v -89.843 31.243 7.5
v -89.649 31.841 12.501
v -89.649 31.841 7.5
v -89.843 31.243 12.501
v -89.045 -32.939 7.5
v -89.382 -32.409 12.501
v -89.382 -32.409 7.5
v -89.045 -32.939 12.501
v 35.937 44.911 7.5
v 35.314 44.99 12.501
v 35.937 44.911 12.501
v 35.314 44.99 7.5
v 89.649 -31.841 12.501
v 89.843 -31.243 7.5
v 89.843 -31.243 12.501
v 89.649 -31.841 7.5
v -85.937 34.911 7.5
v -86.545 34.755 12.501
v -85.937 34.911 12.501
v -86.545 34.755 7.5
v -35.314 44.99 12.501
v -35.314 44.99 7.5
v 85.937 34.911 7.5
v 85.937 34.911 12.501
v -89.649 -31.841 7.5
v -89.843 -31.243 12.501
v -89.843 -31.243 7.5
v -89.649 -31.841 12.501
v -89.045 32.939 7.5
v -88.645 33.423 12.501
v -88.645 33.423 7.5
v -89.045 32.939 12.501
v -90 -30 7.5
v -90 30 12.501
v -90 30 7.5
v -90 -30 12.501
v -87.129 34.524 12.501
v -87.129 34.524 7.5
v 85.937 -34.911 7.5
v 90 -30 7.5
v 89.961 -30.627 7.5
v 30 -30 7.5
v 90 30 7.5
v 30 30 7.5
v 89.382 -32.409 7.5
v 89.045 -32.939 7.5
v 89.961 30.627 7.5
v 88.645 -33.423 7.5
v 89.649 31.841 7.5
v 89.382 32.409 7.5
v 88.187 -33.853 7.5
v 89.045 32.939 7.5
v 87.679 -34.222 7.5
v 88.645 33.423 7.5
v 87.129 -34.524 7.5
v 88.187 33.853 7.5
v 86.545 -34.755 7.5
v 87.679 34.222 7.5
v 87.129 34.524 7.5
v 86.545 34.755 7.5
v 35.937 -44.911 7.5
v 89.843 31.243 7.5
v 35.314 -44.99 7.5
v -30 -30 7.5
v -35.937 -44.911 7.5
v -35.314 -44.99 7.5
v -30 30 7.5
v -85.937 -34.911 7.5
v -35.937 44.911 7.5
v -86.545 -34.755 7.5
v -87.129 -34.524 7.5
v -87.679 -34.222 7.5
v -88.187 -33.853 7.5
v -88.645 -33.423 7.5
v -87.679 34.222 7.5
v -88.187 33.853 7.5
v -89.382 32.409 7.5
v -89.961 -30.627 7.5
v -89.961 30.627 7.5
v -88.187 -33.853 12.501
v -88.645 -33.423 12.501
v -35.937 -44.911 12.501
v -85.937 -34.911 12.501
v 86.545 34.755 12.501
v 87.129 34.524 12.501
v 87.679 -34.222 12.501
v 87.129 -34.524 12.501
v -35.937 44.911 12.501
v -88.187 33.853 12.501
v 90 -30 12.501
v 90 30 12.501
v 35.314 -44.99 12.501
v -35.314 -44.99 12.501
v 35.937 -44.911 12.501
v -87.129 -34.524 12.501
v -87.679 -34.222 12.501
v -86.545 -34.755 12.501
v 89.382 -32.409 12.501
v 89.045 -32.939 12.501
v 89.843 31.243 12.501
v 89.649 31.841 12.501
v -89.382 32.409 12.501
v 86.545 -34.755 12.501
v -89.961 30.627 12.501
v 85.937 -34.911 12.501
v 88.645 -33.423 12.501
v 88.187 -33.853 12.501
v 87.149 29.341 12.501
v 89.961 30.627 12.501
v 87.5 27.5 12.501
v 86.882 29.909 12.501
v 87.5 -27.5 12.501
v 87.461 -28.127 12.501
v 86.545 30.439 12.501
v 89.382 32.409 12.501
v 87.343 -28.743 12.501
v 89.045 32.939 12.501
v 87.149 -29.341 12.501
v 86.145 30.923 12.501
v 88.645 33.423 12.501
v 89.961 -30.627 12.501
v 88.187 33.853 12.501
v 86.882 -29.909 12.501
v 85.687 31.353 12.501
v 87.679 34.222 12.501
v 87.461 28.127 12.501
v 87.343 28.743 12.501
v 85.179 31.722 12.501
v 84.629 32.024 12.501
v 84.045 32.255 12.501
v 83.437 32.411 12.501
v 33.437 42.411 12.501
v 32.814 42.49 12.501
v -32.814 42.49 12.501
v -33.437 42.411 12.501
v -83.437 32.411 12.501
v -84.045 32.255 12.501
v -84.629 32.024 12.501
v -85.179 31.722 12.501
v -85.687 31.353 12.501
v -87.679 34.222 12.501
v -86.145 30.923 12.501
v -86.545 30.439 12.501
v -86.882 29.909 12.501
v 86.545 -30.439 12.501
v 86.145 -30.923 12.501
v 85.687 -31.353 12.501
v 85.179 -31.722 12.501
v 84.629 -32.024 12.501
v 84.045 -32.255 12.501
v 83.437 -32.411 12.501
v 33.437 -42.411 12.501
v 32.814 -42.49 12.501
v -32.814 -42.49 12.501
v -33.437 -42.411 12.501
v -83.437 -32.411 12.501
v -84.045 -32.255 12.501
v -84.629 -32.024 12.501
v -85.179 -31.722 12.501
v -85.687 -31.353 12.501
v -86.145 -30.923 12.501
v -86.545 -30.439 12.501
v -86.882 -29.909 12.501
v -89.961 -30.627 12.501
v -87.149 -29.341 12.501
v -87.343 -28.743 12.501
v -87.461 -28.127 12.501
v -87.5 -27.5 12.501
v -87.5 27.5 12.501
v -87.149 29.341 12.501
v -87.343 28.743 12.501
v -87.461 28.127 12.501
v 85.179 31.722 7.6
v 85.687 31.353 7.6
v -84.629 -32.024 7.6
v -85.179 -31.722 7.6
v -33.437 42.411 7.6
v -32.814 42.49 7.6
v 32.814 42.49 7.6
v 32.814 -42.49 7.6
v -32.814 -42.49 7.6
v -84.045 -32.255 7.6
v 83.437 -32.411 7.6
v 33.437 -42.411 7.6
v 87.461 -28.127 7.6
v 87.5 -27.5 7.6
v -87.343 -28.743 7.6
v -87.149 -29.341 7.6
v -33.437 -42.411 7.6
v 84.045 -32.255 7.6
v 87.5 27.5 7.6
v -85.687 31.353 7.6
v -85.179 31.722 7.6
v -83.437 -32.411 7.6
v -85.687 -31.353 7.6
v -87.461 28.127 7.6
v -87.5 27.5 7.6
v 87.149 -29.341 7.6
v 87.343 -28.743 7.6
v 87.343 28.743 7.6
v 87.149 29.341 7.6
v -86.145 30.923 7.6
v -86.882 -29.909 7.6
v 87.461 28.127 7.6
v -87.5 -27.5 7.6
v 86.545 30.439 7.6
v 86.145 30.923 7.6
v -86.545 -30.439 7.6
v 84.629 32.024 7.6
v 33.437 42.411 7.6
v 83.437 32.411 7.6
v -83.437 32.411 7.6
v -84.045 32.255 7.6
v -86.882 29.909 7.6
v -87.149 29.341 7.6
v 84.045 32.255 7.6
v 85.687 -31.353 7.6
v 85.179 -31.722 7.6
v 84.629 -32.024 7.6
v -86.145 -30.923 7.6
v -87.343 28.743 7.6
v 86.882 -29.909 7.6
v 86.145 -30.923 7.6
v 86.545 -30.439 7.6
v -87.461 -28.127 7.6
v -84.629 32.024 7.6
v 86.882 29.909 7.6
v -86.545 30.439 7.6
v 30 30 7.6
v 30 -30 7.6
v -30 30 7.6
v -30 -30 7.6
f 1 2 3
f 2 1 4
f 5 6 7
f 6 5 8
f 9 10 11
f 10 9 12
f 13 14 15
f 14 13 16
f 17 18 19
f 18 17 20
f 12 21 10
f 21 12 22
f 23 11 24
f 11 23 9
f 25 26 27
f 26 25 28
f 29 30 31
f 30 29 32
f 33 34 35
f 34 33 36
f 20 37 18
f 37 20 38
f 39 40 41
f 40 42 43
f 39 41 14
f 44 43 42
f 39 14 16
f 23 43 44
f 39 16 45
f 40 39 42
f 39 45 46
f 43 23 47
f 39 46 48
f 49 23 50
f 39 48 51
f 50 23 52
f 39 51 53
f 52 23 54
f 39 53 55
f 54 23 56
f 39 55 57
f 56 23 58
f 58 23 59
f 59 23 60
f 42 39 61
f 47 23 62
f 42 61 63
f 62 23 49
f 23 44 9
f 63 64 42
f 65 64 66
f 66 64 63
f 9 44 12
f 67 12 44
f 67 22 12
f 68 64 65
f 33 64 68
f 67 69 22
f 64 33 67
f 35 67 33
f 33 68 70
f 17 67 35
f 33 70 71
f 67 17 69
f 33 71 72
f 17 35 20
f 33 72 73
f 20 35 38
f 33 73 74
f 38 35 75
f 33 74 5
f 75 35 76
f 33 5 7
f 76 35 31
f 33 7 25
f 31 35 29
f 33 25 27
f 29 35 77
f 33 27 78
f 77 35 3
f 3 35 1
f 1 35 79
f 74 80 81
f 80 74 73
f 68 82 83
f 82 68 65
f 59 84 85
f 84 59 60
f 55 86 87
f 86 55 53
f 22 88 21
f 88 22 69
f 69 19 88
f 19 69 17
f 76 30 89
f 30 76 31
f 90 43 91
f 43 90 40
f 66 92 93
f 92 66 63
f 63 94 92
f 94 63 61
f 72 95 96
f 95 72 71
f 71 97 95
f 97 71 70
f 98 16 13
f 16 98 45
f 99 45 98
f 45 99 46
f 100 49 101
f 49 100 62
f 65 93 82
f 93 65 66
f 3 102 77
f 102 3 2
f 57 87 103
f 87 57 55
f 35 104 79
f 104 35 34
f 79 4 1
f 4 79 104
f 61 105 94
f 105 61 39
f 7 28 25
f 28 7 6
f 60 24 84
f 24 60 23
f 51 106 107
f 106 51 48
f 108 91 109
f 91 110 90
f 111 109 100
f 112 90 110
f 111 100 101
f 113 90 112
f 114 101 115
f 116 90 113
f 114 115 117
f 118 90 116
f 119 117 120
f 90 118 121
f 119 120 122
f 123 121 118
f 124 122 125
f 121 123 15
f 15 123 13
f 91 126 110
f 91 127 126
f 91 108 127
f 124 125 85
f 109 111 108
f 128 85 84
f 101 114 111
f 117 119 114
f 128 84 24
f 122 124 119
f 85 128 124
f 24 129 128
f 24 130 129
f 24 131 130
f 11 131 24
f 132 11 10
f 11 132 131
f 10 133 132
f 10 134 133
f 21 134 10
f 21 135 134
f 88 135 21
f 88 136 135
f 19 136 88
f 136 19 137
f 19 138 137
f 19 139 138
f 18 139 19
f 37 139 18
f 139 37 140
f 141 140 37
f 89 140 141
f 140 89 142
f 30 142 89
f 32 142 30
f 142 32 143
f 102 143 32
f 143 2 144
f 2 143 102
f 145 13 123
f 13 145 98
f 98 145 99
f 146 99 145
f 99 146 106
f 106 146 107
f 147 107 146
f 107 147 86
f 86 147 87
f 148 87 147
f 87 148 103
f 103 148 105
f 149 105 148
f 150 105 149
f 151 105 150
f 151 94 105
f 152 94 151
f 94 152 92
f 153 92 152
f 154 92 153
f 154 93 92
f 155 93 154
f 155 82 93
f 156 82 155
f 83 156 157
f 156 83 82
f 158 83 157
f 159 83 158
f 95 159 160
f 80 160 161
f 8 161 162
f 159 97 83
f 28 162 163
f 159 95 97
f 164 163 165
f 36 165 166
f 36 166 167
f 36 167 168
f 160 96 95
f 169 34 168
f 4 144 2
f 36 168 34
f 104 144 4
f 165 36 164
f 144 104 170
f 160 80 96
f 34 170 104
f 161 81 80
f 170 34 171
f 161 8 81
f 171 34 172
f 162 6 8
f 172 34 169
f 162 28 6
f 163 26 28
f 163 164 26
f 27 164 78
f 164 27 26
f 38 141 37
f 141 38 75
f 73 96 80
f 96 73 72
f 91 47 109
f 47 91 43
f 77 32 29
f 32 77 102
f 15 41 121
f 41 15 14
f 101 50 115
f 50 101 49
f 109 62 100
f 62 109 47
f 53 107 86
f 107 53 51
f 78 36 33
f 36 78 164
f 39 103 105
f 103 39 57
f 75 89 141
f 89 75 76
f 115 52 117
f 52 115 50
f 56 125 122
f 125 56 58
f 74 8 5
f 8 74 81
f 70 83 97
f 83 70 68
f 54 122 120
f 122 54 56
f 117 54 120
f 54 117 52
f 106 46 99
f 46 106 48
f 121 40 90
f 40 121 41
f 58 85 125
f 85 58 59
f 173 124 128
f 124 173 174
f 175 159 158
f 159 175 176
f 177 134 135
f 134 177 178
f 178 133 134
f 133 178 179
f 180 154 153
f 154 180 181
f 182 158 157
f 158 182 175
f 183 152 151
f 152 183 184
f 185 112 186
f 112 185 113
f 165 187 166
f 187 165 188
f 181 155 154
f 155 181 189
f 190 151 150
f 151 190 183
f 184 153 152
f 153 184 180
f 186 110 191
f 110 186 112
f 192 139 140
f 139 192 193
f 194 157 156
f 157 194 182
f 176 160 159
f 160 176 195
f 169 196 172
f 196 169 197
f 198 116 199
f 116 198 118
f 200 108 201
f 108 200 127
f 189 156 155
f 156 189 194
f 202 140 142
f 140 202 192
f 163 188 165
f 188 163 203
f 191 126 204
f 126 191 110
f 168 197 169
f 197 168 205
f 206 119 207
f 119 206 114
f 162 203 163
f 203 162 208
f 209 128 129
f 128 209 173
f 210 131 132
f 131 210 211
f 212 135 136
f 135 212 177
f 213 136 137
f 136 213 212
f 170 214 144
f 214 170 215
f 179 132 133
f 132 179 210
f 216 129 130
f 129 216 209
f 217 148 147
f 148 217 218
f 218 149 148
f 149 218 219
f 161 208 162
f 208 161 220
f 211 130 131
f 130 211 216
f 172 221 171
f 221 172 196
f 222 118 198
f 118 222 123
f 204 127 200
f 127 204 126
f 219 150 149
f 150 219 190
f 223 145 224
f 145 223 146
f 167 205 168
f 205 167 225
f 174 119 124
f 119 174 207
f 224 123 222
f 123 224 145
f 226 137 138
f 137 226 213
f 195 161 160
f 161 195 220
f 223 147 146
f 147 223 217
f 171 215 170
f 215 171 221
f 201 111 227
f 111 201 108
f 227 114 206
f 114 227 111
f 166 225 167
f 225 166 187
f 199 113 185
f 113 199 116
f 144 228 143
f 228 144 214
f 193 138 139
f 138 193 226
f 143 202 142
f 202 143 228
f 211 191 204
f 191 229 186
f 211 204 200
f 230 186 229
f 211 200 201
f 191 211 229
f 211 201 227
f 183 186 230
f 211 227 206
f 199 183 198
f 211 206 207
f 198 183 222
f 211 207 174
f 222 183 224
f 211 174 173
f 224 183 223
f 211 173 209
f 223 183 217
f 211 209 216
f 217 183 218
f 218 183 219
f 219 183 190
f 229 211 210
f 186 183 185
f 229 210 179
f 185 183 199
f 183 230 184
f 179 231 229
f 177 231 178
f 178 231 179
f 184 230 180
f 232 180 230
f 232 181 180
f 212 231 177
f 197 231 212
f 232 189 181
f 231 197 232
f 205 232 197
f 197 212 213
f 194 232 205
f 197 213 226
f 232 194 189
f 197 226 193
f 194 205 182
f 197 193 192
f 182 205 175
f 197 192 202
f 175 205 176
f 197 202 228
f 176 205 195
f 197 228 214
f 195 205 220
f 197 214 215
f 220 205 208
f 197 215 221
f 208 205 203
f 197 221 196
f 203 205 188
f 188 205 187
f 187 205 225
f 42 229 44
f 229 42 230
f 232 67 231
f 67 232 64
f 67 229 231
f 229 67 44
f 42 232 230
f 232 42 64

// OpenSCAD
module basicPlate(total_w,total_h,little_w,little_h)
{
	hull()
	{
		minkowski() 
		{
			cube([total_w,little_h,5], center = true);			
			cylinder(r=5,h=0.001);
		};
		minkowski() 
		{
			cube([little_w,total_h,5], center = true);
			cylinder(r=5,h=0.001);
		};
	};
}

module example006()
{
	$fn=50;
	translate([0,0,10])
	difference()
	{
		difference()
		{
			basicPlate(170,80,70,60);
			translate([0,0,0.1]) basicPlate(170-5,80-5,70-5,60-5);
		};
		cube([60,60,10], center = true);
	}
}

example006();
